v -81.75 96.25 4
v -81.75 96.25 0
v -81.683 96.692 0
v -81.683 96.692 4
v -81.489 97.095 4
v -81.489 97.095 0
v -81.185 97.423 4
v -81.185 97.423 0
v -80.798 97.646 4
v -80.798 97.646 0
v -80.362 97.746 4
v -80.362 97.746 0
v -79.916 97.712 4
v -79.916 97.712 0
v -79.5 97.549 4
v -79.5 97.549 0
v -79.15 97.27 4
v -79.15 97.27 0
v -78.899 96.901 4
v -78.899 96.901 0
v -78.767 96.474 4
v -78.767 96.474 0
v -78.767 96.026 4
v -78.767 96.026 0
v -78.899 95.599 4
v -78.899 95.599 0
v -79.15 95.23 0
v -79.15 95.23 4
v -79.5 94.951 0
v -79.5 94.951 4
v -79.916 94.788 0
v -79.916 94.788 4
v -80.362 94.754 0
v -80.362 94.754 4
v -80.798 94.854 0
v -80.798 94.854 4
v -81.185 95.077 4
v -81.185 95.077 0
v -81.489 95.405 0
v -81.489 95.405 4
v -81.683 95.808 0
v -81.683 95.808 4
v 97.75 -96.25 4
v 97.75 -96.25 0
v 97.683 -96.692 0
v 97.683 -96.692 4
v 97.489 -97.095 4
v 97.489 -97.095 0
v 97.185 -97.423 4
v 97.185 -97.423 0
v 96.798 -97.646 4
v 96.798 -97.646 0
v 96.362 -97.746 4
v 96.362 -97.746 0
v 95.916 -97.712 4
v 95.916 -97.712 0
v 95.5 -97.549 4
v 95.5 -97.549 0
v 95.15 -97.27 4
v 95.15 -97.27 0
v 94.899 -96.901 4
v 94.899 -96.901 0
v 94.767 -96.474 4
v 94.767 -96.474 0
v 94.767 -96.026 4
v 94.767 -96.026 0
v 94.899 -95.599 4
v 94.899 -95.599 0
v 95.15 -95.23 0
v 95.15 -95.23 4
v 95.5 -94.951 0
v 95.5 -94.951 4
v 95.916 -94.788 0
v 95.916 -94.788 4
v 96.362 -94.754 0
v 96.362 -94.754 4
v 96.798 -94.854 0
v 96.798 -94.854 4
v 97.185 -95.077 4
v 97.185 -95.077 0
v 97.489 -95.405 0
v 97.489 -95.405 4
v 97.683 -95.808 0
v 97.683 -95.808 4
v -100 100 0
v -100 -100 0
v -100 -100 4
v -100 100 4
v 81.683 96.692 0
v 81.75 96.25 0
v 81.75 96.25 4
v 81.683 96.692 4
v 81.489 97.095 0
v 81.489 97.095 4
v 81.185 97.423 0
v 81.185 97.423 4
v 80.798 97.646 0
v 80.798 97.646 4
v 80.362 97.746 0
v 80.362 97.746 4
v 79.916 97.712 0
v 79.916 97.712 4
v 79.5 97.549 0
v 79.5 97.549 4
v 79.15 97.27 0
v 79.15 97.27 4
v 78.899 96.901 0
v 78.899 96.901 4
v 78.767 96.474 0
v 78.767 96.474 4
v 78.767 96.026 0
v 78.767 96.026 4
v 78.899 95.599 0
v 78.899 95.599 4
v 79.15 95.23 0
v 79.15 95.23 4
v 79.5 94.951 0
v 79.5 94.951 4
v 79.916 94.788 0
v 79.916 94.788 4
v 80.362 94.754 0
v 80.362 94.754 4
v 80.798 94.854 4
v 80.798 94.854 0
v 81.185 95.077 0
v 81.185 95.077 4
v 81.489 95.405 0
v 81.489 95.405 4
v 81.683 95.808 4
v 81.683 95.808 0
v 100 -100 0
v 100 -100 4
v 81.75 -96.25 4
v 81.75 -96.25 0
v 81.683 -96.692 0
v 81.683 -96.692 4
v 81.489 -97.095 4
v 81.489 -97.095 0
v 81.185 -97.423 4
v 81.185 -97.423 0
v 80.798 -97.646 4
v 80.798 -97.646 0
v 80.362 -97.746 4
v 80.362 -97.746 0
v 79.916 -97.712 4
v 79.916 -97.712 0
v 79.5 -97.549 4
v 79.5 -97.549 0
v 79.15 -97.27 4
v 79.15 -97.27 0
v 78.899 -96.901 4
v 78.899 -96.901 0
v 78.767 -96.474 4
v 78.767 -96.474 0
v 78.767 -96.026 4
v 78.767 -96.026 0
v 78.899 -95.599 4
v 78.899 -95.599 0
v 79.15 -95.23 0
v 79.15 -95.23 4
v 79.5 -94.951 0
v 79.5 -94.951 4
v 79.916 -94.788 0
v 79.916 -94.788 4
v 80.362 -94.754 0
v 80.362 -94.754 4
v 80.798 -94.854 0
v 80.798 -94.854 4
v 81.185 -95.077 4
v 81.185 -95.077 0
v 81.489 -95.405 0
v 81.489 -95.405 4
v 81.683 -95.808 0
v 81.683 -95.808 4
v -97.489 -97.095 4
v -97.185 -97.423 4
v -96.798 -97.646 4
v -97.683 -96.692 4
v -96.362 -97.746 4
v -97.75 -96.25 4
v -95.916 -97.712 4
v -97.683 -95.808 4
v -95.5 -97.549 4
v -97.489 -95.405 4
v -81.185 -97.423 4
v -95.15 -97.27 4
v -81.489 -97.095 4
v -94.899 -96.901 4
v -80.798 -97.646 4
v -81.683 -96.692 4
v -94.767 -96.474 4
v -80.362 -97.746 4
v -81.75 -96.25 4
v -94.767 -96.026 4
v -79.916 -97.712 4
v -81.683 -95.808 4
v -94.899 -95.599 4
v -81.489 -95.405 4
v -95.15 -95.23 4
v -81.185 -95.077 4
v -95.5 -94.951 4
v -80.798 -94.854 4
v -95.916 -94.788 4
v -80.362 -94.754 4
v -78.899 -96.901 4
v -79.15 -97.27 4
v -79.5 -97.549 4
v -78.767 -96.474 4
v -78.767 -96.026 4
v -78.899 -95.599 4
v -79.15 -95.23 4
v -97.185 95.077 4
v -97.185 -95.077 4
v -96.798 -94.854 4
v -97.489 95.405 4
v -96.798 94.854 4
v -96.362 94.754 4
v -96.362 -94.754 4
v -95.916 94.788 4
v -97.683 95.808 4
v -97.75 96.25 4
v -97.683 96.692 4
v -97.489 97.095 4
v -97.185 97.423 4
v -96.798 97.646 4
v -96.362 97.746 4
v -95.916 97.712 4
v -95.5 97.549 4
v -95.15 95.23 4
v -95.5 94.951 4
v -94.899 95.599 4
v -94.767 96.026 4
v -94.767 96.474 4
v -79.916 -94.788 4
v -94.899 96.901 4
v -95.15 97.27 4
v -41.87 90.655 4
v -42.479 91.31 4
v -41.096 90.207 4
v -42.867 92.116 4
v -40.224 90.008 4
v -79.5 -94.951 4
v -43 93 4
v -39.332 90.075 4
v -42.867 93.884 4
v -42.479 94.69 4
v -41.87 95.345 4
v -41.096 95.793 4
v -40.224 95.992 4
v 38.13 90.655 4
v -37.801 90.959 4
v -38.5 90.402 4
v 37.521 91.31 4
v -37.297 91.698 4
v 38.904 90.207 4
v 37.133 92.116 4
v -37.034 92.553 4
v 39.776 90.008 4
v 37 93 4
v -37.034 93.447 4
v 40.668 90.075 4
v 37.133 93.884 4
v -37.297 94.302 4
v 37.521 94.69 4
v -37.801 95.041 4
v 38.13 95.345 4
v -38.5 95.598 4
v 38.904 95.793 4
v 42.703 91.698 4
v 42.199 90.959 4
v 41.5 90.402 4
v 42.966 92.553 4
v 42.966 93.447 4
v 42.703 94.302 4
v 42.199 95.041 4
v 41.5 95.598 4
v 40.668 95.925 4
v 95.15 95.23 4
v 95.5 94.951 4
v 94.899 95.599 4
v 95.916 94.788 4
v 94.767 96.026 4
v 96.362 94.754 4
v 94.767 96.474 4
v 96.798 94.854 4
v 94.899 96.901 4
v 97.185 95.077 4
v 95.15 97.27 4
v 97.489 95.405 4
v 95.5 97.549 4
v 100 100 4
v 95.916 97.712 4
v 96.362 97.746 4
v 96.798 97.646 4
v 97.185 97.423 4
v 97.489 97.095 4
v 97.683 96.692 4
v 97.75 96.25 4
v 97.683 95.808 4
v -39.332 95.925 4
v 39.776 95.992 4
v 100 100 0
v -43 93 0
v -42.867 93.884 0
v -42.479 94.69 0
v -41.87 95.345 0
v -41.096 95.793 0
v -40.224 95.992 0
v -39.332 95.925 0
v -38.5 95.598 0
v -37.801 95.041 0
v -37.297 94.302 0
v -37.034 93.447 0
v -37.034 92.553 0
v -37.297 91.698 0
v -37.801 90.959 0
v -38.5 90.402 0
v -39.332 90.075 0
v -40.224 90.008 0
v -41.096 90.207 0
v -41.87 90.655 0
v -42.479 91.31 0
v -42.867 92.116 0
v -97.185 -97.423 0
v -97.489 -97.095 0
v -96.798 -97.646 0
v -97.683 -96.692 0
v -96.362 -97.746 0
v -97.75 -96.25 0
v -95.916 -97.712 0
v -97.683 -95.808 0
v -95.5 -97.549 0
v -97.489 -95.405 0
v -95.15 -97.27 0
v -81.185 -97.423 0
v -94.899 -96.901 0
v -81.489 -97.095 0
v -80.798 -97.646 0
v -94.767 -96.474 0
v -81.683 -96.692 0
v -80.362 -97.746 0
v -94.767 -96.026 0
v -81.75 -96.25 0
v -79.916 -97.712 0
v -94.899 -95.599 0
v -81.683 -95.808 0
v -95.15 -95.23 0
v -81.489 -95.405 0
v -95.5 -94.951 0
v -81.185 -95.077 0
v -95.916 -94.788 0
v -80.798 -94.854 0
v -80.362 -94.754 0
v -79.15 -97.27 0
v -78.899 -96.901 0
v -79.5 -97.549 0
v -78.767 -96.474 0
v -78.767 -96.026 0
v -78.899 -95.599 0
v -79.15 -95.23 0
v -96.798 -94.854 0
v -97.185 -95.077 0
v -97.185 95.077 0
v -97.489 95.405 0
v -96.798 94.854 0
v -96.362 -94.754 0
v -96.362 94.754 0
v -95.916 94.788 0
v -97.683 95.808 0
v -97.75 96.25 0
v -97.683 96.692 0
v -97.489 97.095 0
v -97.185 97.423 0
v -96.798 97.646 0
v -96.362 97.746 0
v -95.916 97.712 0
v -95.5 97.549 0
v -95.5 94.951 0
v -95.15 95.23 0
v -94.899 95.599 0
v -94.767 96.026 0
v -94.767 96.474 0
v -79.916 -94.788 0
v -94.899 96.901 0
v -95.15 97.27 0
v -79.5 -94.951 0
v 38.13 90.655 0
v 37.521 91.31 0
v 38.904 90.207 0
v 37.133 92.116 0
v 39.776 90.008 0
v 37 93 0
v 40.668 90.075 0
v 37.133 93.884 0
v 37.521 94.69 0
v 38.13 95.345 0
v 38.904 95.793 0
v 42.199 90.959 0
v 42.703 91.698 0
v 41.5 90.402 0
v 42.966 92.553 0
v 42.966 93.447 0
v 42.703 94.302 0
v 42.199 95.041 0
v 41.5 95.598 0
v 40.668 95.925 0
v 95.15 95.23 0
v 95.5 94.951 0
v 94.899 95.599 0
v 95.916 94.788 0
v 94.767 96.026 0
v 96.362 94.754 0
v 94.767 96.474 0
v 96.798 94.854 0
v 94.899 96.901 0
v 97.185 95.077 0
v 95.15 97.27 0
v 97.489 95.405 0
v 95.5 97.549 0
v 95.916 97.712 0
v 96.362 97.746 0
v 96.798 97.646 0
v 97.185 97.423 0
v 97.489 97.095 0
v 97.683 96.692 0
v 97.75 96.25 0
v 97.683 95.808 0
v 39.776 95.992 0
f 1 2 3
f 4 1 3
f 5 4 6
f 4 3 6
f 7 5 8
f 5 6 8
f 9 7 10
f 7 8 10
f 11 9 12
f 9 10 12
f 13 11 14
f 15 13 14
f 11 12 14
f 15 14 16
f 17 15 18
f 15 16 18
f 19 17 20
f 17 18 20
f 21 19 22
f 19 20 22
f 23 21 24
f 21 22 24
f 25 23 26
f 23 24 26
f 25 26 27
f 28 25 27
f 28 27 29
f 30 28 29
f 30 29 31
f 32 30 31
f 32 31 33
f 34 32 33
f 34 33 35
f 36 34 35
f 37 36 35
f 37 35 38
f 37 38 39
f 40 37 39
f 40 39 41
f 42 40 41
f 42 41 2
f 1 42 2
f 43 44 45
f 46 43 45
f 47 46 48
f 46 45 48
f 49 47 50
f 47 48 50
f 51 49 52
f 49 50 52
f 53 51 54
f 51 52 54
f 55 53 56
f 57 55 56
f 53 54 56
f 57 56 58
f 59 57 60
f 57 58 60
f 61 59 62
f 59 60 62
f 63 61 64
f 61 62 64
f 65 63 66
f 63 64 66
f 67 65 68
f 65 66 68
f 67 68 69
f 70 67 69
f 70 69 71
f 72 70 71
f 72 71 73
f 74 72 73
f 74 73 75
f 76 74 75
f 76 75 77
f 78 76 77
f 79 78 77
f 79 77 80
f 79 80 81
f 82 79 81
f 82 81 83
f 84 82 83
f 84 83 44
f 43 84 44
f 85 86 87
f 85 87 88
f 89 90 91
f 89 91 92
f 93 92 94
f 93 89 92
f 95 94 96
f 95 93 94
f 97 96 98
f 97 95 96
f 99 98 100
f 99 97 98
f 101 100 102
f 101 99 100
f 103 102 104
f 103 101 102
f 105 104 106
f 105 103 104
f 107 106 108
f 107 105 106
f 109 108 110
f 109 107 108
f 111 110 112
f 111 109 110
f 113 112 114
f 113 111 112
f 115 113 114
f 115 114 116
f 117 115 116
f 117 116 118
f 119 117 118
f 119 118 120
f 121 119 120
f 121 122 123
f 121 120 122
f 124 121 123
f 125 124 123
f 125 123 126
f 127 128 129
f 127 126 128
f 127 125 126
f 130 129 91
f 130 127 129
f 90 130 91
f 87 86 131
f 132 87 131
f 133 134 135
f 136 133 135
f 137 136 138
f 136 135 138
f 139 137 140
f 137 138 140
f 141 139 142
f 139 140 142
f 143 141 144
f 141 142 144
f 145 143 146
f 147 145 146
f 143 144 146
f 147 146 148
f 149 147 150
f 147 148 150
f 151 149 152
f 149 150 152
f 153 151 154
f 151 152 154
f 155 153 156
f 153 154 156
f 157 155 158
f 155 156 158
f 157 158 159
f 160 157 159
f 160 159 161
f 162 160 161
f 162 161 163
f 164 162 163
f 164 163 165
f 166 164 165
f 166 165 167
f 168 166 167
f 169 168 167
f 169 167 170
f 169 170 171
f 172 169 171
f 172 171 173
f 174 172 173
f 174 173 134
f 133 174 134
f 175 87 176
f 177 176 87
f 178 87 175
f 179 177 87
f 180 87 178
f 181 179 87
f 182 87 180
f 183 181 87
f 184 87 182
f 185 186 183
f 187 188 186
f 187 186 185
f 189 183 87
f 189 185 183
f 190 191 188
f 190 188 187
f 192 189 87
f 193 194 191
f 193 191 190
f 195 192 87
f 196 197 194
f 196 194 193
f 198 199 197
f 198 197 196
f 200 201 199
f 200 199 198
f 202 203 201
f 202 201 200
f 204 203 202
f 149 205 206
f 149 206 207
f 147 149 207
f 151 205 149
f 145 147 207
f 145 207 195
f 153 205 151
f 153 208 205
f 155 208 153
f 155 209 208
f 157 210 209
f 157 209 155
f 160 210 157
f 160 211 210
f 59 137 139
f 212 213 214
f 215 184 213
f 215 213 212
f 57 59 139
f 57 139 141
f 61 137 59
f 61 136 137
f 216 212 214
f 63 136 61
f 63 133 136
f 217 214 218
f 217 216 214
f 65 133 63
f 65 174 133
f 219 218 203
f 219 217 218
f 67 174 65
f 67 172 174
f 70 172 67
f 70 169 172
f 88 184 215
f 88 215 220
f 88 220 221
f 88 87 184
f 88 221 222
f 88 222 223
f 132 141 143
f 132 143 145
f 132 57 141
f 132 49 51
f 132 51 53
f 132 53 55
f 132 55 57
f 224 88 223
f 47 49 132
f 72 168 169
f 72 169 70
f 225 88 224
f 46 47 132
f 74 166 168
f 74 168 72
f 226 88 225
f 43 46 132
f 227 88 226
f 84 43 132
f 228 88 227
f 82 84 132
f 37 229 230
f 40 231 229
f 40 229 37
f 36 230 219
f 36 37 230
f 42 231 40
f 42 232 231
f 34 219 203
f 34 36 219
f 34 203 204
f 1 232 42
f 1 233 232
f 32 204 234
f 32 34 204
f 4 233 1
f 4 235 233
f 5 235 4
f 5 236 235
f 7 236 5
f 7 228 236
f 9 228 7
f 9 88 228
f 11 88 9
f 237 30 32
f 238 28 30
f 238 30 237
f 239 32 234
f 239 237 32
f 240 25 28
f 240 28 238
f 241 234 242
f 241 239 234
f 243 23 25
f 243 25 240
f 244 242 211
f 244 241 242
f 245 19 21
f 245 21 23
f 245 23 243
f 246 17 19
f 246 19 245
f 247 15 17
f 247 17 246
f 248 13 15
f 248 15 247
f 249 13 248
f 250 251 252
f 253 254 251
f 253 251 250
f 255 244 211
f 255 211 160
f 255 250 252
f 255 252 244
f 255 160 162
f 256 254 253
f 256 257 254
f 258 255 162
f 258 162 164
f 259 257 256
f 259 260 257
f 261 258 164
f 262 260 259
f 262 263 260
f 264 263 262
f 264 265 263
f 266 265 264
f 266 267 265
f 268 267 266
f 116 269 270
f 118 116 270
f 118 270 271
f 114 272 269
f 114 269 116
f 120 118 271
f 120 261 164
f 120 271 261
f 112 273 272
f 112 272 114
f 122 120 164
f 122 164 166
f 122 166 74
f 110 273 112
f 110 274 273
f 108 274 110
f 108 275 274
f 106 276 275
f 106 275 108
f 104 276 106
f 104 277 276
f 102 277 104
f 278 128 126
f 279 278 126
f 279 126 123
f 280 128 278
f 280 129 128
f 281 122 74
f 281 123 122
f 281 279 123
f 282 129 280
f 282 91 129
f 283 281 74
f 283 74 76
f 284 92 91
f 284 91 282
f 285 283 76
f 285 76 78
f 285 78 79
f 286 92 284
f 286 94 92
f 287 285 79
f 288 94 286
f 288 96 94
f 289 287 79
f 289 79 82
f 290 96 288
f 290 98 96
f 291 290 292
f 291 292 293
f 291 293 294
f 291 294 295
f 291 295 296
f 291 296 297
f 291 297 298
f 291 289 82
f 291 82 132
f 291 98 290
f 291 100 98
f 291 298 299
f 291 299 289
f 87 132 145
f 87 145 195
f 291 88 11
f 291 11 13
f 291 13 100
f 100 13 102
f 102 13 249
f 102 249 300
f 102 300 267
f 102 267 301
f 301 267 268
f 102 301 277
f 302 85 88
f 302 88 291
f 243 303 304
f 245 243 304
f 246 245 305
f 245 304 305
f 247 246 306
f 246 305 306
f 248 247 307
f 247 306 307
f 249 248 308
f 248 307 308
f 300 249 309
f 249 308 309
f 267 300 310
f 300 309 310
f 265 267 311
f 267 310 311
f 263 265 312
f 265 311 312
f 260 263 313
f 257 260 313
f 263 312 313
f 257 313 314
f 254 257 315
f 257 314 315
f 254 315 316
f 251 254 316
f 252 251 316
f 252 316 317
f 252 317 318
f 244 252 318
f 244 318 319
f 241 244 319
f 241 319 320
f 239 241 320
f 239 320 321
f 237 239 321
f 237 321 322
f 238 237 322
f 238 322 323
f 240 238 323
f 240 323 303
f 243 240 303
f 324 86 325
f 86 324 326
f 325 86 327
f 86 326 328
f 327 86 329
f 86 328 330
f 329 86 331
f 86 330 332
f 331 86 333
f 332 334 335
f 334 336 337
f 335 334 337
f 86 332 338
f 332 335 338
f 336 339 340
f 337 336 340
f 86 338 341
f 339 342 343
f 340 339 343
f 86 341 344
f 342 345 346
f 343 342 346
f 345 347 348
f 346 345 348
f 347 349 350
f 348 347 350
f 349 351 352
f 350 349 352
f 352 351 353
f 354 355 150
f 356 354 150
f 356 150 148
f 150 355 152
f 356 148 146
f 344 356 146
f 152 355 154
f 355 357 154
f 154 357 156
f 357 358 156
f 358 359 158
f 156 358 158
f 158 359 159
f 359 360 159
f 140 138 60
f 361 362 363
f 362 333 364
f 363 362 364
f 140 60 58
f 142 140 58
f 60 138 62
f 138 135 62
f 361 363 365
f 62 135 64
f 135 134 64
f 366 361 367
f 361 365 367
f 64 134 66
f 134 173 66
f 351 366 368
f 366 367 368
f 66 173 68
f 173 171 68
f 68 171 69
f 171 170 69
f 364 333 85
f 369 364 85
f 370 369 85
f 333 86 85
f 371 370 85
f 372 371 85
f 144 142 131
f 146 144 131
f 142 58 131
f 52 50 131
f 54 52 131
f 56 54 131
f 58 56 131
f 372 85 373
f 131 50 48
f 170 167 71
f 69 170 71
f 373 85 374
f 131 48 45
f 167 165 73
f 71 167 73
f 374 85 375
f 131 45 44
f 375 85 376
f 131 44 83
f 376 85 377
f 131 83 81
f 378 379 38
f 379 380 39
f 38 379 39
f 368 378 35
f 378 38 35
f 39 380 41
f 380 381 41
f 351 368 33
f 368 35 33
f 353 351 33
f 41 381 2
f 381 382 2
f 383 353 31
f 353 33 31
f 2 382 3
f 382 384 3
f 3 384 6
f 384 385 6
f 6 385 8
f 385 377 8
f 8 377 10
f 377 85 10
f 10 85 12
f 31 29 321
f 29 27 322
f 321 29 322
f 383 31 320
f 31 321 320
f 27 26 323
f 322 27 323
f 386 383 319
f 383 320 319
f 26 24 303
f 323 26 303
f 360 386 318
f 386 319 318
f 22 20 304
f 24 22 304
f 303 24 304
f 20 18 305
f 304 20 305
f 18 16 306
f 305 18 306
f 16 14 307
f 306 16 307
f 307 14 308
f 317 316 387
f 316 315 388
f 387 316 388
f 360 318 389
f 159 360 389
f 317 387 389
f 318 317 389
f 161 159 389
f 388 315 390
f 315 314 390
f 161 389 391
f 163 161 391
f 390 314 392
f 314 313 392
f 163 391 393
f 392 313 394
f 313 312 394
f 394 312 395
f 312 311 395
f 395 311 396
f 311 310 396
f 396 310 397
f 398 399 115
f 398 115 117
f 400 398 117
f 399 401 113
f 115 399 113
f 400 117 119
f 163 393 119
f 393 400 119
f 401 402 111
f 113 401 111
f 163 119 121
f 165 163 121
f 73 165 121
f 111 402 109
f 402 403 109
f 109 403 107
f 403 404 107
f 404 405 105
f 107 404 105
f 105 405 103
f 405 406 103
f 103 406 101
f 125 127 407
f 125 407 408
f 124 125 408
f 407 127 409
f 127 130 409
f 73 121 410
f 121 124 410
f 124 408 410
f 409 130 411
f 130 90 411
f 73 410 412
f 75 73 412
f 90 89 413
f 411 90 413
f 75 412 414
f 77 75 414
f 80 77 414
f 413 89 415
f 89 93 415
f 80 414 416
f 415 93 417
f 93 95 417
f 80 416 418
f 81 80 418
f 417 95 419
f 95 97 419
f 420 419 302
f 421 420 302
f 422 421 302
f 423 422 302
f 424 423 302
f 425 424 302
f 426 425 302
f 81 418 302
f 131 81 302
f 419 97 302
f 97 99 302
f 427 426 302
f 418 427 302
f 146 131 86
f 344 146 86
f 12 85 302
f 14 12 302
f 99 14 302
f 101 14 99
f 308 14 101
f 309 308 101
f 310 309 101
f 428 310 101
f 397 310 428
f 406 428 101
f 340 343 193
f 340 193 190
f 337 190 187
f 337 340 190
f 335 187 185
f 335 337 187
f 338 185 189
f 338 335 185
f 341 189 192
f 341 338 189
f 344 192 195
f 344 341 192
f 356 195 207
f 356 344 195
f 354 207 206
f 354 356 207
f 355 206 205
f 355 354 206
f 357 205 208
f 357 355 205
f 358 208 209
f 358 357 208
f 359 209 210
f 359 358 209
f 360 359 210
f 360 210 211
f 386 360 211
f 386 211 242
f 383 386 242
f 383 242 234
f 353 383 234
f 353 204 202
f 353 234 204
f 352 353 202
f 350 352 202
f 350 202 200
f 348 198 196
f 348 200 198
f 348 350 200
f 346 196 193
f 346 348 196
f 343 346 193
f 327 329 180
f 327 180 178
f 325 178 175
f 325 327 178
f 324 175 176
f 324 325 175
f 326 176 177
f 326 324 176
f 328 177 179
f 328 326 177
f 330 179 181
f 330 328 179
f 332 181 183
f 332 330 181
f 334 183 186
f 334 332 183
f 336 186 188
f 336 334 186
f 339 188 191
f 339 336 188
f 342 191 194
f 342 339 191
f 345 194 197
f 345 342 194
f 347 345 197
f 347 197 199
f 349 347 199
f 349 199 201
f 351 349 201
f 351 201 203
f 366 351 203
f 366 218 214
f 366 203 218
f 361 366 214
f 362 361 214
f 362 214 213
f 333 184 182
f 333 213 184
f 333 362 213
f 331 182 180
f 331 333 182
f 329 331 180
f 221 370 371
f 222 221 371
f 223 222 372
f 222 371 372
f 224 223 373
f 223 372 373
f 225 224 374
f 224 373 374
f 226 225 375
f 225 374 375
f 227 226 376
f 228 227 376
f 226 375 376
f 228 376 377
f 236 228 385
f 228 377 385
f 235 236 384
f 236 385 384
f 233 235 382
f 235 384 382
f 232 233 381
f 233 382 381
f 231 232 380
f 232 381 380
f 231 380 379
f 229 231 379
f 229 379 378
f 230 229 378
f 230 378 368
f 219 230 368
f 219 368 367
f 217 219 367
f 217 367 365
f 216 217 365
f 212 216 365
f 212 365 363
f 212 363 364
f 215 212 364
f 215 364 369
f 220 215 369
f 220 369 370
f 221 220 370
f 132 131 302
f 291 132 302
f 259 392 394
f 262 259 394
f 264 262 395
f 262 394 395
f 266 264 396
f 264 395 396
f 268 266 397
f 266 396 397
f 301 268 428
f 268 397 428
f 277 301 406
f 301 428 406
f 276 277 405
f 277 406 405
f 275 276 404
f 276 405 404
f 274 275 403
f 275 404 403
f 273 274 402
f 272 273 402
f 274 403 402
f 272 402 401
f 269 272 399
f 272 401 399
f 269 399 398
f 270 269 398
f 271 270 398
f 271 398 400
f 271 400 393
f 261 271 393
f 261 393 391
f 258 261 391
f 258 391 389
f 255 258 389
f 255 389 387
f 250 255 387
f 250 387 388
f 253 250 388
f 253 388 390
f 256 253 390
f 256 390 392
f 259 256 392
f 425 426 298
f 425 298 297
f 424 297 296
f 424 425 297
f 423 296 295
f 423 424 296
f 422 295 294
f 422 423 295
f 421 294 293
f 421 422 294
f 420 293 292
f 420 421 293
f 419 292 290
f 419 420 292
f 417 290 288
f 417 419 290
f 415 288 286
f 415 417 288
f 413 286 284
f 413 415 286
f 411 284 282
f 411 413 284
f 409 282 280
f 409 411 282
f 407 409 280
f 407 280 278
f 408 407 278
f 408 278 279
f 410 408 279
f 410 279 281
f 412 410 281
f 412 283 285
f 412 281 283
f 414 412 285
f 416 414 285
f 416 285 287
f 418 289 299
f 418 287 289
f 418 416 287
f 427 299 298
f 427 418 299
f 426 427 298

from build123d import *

# Parameters (mm, degrees)
SKETCH1_W                 = 200
SKETCH1_H                 = 200
BOSS_EXTRUDE1_DEPTH       = 4
F_3_0MM_DOWEL_HOLE1_D     = 3
F_3_0MM_DOWEL_HOLE1_DEPTH = 4.001
MIRROR2_COPY_1_D          = 3
MIRROR2_COPY_1_DEPTH      = 4.001
CUT_EXTRUDE1_REACH        = 6
SKETCH6_R                 = 3


with BuildPart() as part:
    # Sketch1 → Boss-Extrude1 (new body)
    with BuildSketch(Plane.XY):
        Rectangle(SKETCH1_W, SKETCH1_H)
    extrude(amount=BOSS_EXTRUDE1_DEPTH)

    # Ø3.0mm Dowel Hole1
    with Locations(Plane.XY.offset(4)):
        with Locations((-80.25, 96.25), (-96.25, 96.25)):
            f_3_0mm_dowel_hole1 = Hole(F_3_0MM_DOWEL_HOLE1_D / 2, depth=F_3_0MM_DOWEL_HOLE1_DEPTH)

    # Mirror1: Ø3.0mm Dowel Hole1 across plane
    add(f_3_0mm_dowel_hole1.mirror(Plane.ZY), mode=Mode.SUBTRACT)

    # Mirror2: Ø3.0mm Dowel Hole1 across plane
    add(f_3_0mm_dowel_hole1.mirror(Plane.ZX), mode=Mode.SUBTRACT)

    # Mirror2 copy 1
    with Locations(Plane(origin=(0, 0, 4), x_dir=(-1, 0, 0), z_dir=(0, 0, 1))):
        with Locations((-80.25, 96.25), (-96.25, 96.25)):
            Hole(MIRROR2_COPY_1_D / 2, depth=MIRROR2_COPY_1_DEPTH)

    # Sketch6 → Cut-Extrude1 (cut, up to next)
    with BuildSketch(Plane(origin=(0, 0, 0), x_dir=(-1, 0, 0), z_dir=(0, 0, -1)), mode=Mode.PRIVATE) as cut_extrude1_sk1:
        with Locations((-40, 93)):
            Circle(SKETCH6_R)
    cut_extrude1_tool1 = extrude(cut_extrude1_sk1.sketch, amount=-CUT_EXTRUDE1_REACH, mode=Mode.PRIVATE) & part.part
    add(cut_extrude1_tool1.solids().sort_by_distance((40, 93, 0))[0], mode=Mode.SUBTRACT)
    # Sketch6 → Cut-Extrude1 (cut, up to next)
    with BuildSketch(Plane(origin=(0, 0, 0), x_dir=(-1, 0, 0), z_dir=(0, 0, -1)), mode=Mode.PRIVATE) as cut_extrude1_sk2:
        with Locations((40, 93)):
            Circle(SKETCH6_R)
    cut_extrude1_tool2 = extrude(cut_extrude1_sk2.sketch, amount=-CUT_EXTRUDE1_REACH, mode=Mode.PRIVATE) & part.part
    add(cut_extrude1_tool2.solids().sort_by_distance((-40, 93, 0))[0], mode=Mode.SUBTRACT)


solid = part.part
